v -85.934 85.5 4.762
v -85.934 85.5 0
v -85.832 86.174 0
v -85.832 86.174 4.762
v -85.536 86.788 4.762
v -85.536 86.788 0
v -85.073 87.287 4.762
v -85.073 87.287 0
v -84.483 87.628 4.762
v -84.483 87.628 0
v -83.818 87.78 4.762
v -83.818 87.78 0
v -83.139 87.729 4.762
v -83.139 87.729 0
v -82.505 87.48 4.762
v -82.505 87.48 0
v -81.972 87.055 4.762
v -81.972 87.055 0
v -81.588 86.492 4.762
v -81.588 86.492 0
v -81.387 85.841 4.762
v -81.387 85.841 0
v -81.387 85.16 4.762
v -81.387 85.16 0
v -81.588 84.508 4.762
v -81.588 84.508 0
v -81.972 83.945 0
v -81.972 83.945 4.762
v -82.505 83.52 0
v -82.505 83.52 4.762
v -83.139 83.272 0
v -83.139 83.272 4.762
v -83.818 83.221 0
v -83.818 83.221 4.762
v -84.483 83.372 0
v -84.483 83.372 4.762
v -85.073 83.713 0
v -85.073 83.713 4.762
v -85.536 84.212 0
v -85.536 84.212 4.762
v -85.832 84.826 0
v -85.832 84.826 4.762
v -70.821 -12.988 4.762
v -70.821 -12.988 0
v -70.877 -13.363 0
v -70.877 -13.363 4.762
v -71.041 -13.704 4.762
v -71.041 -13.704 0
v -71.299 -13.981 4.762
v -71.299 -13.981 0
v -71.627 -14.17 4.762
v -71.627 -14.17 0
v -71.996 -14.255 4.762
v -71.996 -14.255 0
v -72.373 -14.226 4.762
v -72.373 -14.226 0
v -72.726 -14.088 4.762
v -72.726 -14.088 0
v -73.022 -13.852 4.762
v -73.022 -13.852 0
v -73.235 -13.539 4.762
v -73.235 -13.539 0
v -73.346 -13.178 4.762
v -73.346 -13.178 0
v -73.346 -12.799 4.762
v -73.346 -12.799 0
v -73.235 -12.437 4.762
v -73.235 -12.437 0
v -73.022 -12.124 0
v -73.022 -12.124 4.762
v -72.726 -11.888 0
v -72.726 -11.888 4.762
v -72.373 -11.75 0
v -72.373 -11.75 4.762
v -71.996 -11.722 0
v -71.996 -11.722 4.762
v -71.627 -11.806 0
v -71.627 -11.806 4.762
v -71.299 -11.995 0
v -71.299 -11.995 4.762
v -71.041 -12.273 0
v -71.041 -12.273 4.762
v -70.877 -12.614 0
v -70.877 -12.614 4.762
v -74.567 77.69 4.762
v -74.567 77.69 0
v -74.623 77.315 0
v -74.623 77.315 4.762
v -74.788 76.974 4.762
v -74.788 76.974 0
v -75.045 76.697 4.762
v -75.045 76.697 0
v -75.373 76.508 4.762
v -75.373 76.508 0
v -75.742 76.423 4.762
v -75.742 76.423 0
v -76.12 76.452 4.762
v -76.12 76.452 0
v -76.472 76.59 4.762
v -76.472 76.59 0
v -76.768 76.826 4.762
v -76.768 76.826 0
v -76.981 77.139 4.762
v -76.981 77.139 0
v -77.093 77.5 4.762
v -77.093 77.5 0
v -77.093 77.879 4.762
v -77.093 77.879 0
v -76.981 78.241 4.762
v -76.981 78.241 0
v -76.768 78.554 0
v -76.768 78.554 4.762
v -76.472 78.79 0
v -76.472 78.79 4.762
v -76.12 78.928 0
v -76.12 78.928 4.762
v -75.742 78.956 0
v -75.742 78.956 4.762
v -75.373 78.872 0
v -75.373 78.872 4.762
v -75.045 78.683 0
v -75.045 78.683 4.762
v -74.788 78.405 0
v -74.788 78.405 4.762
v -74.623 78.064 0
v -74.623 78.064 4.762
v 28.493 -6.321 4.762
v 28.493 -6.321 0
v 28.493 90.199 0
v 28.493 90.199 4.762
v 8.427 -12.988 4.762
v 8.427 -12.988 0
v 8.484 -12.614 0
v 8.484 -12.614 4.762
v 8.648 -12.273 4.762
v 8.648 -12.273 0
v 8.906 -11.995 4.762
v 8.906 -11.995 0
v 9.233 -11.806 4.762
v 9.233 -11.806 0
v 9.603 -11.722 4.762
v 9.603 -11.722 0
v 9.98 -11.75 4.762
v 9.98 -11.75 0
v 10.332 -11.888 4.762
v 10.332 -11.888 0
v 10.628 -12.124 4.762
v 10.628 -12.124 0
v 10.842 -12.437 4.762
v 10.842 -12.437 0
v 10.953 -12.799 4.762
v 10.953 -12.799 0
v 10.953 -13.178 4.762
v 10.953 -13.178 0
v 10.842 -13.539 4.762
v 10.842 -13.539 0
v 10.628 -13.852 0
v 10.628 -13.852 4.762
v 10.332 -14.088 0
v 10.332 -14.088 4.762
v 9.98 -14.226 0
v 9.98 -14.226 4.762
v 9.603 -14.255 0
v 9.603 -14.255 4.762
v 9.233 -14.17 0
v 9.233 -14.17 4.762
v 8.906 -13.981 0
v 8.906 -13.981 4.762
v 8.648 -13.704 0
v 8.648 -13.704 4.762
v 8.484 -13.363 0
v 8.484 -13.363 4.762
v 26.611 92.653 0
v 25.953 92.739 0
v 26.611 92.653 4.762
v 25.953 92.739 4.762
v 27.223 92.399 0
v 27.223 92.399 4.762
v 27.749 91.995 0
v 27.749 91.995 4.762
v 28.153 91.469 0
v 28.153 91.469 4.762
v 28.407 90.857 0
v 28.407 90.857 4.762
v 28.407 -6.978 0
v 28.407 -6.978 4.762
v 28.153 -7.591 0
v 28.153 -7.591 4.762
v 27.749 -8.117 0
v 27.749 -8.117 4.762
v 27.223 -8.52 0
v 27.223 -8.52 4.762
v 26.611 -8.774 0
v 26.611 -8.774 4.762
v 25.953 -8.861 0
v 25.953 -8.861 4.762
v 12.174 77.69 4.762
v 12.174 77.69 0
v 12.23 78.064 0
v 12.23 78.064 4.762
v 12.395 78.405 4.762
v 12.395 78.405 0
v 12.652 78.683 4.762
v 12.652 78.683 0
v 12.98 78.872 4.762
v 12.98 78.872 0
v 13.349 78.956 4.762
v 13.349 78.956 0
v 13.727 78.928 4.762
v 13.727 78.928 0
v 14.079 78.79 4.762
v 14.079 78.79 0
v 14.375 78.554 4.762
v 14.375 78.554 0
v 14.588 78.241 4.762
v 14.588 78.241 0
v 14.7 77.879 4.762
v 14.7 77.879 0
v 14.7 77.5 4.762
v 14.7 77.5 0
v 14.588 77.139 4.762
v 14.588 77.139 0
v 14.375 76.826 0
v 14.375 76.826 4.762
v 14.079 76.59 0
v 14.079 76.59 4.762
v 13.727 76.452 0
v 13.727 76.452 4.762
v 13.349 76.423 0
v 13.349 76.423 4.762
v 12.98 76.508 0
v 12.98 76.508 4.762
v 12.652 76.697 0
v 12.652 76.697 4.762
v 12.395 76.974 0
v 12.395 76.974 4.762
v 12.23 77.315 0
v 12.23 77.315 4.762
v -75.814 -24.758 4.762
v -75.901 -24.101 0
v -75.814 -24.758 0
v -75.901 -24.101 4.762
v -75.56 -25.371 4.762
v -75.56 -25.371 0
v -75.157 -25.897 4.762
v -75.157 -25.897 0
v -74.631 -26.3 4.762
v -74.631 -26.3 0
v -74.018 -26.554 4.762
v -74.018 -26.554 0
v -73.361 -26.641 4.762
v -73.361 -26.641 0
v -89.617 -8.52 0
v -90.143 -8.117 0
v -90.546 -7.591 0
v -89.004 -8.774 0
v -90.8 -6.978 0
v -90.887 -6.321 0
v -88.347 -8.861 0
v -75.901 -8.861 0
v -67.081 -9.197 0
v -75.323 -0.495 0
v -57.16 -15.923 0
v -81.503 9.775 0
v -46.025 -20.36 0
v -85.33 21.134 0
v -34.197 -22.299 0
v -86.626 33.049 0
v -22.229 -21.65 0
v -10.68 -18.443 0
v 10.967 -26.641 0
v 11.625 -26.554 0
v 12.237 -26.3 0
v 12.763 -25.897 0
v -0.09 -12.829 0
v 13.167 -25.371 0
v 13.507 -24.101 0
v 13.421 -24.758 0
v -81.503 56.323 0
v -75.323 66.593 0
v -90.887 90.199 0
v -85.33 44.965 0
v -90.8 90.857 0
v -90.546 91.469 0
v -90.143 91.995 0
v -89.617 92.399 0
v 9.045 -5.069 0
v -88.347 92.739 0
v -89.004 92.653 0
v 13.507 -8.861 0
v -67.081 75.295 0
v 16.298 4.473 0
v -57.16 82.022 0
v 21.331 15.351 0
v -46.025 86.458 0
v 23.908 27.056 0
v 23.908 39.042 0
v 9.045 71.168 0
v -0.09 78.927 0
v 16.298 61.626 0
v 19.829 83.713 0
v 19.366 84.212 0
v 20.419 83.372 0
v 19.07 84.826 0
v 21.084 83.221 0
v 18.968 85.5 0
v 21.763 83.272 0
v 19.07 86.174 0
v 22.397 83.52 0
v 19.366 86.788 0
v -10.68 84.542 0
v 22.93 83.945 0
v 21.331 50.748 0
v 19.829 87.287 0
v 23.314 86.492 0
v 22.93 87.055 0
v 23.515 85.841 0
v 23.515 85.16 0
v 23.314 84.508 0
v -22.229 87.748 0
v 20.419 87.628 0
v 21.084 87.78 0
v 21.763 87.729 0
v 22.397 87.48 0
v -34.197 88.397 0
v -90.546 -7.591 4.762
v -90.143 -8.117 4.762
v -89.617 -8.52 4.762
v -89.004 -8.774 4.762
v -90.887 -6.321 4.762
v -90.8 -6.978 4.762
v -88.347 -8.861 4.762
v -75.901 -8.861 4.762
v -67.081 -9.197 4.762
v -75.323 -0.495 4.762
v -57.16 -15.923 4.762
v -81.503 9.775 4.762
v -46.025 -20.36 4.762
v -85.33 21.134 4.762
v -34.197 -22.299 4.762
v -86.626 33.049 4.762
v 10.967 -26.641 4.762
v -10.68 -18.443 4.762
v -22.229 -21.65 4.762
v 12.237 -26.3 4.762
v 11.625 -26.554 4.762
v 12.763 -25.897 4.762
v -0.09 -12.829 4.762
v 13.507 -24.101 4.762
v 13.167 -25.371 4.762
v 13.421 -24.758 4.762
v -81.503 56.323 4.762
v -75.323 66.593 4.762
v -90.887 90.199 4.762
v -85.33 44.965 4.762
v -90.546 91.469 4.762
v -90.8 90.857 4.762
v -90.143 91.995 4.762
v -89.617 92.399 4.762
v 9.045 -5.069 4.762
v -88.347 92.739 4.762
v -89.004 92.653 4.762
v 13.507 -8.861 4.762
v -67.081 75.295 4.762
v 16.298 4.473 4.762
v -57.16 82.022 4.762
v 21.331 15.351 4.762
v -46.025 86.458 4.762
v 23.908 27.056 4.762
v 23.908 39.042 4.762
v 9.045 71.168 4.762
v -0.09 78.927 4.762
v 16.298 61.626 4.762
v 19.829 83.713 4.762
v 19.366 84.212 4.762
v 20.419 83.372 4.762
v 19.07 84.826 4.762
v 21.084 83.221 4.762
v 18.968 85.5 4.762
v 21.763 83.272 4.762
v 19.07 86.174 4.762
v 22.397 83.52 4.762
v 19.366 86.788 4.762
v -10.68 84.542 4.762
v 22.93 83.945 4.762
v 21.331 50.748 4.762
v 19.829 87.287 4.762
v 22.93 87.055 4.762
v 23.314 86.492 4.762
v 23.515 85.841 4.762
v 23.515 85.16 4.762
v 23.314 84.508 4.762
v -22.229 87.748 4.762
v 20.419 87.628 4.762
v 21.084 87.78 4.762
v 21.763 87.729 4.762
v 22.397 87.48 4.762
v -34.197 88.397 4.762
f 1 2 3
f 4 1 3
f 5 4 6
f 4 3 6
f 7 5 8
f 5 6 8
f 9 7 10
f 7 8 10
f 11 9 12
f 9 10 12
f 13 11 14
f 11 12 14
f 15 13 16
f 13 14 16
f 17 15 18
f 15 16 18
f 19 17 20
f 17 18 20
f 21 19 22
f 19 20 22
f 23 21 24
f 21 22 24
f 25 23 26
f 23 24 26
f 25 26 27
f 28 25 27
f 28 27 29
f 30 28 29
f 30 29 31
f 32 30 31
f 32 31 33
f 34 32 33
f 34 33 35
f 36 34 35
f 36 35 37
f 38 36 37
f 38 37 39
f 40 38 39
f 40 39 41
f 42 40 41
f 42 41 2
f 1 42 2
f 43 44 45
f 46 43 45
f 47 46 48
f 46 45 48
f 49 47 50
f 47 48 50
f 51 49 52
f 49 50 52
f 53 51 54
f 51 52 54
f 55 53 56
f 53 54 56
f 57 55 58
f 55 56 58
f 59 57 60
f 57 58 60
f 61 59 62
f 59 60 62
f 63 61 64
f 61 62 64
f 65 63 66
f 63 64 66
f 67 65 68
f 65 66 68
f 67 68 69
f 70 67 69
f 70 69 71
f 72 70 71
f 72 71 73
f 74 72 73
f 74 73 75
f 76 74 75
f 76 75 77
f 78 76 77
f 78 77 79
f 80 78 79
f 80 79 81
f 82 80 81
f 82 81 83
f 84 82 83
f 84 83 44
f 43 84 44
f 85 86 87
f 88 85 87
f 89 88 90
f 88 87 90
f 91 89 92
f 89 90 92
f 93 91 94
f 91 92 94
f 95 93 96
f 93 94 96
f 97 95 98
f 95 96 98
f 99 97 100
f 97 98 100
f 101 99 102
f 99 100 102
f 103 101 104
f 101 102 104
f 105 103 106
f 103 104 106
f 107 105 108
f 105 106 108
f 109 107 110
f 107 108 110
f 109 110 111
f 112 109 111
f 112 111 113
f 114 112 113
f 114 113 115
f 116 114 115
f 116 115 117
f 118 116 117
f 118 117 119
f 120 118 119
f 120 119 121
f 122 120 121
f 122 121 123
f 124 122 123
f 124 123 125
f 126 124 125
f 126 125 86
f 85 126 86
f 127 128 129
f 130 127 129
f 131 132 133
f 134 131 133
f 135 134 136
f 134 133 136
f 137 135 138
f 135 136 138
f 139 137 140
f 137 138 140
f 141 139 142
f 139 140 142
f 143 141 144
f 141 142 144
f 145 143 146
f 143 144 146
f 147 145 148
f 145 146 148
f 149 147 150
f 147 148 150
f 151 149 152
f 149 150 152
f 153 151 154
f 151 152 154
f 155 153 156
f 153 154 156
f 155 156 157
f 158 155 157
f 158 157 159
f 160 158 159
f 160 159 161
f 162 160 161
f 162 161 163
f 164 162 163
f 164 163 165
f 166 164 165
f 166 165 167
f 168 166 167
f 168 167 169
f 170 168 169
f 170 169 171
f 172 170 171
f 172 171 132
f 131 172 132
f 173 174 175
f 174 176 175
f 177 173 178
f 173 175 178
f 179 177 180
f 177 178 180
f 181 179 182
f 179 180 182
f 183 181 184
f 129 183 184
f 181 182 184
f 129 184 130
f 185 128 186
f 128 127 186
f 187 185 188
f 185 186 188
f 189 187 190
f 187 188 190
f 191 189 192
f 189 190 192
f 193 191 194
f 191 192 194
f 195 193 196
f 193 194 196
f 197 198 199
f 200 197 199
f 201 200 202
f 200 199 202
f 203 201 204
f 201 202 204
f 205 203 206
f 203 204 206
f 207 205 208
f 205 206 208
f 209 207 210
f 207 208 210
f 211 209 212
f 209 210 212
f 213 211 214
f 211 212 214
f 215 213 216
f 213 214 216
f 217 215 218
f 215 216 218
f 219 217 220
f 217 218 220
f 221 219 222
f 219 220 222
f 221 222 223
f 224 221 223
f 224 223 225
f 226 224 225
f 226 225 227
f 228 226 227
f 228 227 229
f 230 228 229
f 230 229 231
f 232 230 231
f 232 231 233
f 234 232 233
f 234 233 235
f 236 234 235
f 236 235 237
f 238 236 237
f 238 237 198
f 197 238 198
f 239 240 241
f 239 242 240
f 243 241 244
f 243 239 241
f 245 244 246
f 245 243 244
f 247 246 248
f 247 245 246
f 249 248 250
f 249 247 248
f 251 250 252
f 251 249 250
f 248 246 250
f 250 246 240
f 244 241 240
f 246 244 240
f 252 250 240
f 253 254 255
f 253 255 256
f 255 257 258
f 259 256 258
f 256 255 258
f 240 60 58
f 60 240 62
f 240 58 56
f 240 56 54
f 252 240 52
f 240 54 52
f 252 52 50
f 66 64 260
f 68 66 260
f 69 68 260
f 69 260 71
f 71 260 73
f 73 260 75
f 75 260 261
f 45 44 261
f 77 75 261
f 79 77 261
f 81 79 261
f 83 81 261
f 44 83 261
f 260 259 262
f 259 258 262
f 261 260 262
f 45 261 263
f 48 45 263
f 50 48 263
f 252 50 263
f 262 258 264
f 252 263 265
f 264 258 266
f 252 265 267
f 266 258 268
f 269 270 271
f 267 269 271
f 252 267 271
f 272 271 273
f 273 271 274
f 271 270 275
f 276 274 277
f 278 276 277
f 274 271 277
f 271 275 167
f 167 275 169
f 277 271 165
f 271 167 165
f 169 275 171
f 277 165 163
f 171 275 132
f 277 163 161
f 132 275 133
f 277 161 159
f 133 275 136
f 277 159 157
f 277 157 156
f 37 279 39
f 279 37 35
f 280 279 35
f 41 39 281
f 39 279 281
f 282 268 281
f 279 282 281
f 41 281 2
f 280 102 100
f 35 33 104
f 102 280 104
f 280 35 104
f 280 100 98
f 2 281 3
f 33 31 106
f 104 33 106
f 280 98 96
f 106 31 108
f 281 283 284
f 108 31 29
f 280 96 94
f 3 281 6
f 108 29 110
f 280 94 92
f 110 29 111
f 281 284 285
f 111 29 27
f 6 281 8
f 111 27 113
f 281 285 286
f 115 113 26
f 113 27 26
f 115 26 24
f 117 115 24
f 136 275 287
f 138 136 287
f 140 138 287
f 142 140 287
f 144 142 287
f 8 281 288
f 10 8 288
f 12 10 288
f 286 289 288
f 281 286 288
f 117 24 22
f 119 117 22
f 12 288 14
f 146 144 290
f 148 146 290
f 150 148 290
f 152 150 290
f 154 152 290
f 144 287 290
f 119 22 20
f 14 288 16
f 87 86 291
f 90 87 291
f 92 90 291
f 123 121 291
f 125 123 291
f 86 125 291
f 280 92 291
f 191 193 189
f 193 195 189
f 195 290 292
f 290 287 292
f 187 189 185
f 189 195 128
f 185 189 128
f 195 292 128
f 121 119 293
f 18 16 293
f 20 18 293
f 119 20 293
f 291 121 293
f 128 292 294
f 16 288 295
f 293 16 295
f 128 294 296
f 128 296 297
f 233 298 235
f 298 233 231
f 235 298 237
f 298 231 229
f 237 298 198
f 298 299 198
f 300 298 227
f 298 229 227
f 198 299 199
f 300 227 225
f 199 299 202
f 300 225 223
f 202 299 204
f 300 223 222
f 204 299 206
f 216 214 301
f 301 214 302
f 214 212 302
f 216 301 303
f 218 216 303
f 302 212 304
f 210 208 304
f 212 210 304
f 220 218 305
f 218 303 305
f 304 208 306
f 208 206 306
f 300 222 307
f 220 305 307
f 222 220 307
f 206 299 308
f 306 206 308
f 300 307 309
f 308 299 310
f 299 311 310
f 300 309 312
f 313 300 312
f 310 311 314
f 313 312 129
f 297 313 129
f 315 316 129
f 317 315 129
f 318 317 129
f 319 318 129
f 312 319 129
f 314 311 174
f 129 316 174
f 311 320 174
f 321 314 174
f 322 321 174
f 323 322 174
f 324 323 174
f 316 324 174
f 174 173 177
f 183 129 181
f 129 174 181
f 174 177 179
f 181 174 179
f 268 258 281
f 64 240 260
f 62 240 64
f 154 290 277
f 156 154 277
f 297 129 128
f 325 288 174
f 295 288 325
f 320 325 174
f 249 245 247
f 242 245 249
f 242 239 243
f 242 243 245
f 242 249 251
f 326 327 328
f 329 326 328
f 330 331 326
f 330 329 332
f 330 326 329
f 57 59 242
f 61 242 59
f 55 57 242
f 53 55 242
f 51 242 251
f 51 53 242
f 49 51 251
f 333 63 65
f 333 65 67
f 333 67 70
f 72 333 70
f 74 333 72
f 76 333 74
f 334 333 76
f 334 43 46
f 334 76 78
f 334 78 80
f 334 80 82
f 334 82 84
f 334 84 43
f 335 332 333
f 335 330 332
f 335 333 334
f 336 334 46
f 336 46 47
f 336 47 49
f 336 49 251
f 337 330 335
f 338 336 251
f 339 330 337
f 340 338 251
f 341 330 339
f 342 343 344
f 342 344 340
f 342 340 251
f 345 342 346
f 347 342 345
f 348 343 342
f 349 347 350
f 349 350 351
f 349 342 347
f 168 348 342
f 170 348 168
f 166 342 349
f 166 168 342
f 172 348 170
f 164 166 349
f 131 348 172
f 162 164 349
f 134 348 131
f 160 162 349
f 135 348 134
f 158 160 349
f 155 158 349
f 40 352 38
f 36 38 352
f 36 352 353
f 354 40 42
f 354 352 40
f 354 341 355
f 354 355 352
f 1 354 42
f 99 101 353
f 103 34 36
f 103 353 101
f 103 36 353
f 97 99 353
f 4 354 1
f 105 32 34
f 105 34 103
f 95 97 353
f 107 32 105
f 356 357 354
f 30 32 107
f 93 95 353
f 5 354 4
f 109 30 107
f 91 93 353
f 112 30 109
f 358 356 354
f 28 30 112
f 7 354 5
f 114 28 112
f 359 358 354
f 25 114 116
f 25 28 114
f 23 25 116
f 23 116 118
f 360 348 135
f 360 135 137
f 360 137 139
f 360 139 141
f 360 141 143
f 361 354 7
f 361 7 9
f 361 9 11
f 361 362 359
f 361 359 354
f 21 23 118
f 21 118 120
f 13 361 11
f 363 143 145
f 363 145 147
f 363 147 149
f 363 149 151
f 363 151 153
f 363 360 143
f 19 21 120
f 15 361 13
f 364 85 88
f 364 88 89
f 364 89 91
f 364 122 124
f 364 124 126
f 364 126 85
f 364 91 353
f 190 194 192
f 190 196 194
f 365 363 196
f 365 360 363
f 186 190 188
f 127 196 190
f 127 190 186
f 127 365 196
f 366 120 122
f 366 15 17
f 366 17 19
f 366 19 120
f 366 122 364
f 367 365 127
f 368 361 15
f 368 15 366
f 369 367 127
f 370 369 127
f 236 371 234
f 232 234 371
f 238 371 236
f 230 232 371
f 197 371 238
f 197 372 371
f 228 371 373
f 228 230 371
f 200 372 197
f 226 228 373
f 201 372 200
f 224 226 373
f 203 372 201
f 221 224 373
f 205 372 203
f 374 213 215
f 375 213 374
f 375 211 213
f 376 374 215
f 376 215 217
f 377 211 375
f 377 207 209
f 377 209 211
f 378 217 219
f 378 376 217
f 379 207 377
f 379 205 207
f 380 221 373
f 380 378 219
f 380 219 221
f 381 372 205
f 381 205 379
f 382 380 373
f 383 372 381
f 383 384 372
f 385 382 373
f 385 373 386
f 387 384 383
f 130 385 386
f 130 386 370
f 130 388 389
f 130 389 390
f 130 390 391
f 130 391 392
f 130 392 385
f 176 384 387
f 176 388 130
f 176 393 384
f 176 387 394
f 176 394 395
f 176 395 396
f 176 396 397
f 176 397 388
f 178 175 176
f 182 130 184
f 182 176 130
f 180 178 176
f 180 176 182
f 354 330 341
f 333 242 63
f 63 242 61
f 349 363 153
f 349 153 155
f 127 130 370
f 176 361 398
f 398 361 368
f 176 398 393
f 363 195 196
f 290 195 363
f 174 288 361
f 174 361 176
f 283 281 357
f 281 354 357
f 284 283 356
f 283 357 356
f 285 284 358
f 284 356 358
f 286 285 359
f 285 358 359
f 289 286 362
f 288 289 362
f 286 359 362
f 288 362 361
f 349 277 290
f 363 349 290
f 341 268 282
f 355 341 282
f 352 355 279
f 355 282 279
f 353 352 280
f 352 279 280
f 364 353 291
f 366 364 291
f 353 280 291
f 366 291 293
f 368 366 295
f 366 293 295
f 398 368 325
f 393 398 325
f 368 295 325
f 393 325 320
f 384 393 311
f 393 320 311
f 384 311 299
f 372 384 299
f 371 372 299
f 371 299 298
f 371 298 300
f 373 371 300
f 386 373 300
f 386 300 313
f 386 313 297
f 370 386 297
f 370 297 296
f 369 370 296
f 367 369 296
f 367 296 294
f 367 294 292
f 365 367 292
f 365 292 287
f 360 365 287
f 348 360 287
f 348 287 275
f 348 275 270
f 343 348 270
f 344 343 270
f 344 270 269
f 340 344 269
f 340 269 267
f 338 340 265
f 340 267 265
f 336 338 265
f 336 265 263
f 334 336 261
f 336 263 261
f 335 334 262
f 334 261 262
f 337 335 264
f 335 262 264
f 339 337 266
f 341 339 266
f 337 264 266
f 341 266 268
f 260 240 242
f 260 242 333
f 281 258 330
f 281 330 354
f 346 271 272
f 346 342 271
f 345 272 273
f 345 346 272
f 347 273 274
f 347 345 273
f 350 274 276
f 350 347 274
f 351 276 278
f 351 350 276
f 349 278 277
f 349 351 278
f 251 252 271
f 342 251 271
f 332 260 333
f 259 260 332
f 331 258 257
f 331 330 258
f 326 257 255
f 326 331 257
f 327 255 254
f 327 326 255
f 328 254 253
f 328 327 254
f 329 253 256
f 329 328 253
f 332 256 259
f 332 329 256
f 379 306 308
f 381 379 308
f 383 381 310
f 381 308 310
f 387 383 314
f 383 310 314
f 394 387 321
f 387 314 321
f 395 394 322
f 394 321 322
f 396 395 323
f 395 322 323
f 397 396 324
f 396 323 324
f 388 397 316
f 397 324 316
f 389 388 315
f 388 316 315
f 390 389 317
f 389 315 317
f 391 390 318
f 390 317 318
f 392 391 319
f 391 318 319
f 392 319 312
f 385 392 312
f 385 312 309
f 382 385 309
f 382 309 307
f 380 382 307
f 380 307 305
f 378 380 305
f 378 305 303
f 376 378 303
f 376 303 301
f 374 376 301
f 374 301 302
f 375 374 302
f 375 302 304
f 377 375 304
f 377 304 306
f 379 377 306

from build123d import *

# Parameters (mm, degrees)
SKETCH1_W           = 119.38
SKETCH1_H           = 119.38
BOSS_EXTRUDE1_DEPTH = 4.7625
CUT_EXTRUDE1_REACH  = 131.937
SKETCH2_R           = 2.286
SKETCH2_R_2         = 1.27
SKETCH2_R_3         = 55.42912263
CUT_EXTRUDE2_REACH  = 131.937
SKETCH4_W           = 14.986
SKETCH4_H           = 17.78
FILLET2_R           = 2.54
FILLET3_R           = 2.54


with BuildPart() as part:
    # Sketch1 → Boss-Extrude1 (new body)
    with BuildSketch(Plane.XY):
        with Locations((-31.19657191, 33.049217791)):
            Rectangle(SKETCH1_W, SKETCH1_H)
    extrude(amount=BOSS_EXTRUDE1_DEPTH)

    # Sketch2 → Cut-Extrude1 (cut, up to next)
    with BuildSketch(Plane(origin=(0, 0, 0), x_dir=(-1, 0, 0), z_dir=(0, 0, -1)), mode=Mode.PRIVATE) as cut_extrude1_sk1:
        with Locations((-21.25442809, 85.500217791)):
            Circle(SKETCH2_R)
    cut_extrude1_tool1 = extrude(cut_extrude1_sk1.sketch, amount=-CUT_EXTRUDE1_REACH, mode=Mode.PRIVATE) & part.part
    # Sketch2 → Cut-Extrude1 (cut, up to next)
    with BuildSketch(Plane(origin=(0, 0, 0), x_dir=(-1, 0, 0), z_dir=(0, 0, -1)), mode=Mode.PRIVATE) as cut_extrude1_sk2:
        with Locations((83.64757191, 85.500217791)):
            Circle(SKETCH2_R)
    cut_extrude1_tool2 = extrude(cut_extrude1_sk2.sketch, amount=-CUT_EXTRUDE1_REACH, mode=Mode.PRIVATE) & part.part
    # Sketch2 → Cut-Extrude1 (cut, up to next)
    with BuildSketch(Plane(origin=(0, 0, 0), x_dir=(-1, 0, 0), z_dir=(0, 0, -1)), mode=Mode.PRIVATE) as cut_extrude1_sk3:
        with Locations(Location((72.09057191, -12.988282209, 0), (0, 0, 180))):
            Circle(SKETCH2_R_2)
    cut_extrude1_tool3 = extrude(cut_extrude1_sk3.sketch, amount=-CUT_EXTRUDE1_REACH, mode=Mode.PRIVATE) & part.part
    # Sketch2 → Cut-Extrude1 (cut, up to next)
    with BuildSketch(Plane(origin=(0, 0, 0), x_dir=(-1, 0, 0), z_dir=(0, 0, -1)), mode=Mode.PRIVATE) as cut_extrude1_sk4:
        with Locations((31.19657191, 33.049217791)):
            Circle(SKETCH2_R_3)
    cut_extrude1_tool4 = extrude(cut_extrude1_sk4.sketch, amount=-CUT_EXTRUDE1_REACH, mode=Mode.PRIVATE) & part.part
    # Sketch2 → Cut-Extrude1 (cut, up to next)
    with BuildSketch(Plane(origin=(0, 0, 0), x_dir=(-1, 0, 0), z_dir=(0, 0, -1)), mode=Mode.PRIVATE) as cut_extrude1_sk5:
        with Locations((-13.44392809, 77.689717791)):
            Circle(SKETCH2_R_2)
    cut_extrude1_tool5 = extrude(cut_extrude1_sk5.sketch, amount=-CUT_EXTRUDE1_REACH, mode=Mode.PRIVATE) & part.part
    # Sketch2 → Cut-Extrude1 (cut, up to next)
    with BuildSketch(Plane(origin=(0, 0, 0), x_dir=(-1, 0, 0), z_dir=(0, 0, -1)), mode=Mode.PRIVATE) as cut_extrude1_sk6:
        with Locations(Location((75.83707191, 77.689717791, 0), (0, 0, 180))):
            Circle(SKETCH2_R_2)
    cut_extrude1_tool6 = extrude(cut_extrude1_sk6.sketch, amount=-CUT_EXTRUDE1_REACH, mode=Mode.PRIVATE) & part.part
    # Sketch2 → Cut-Extrude1 (cut, up to next)
    with BuildSketch(Plane(origin=(0, 0, 0), x_dir=(-1, 0, 0), z_dir=(0, 0, -1)), mode=Mode.PRIVATE) as cut_extrude1_sk7:
        with Locations((-9.69742809, -12.988282209)):
            Circle(SKETCH2_R_2)
    cut_extrude1_tool7 = extrude(cut_extrude1_sk7.sketch, amount=-CUT_EXTRUDE1_REACH, mode=Mode.PRIVATE) & part.part
    add(cut_extrude1_tool1.solids().sort_by_distance((21.254428, 85.500218, 0))[0], mode=Mode.SUBTRACT)
    add(cut_extrude1_tool2.solids().sort_by_distance((-83.647572, 85.500218, 0))[0], mode=Mode.SUBTRACT)
    add(cut_extrude1_tool3.solids().sort_by_distance((-72.090572, -12.988282, 0))[0], mode=Mode.SUBTRACT)
    add(cut_extrude1_tool4.solids().sort_by_distance((-31.196572, 33.049218, 0))[0], mode=Mode.SUBTRACT)
    add(cut_extrude1_tool5.solids().sort_by_distance((13.443928, 77.689718, 0))[0], mode=Mode.SUBTRACT)
    add(cut_extrude1_tool6.solids().sort_by_distance((-75.837072, 77.689718, 0))[0], mode=Mode.SUBTRACT)
    add(cut_extrude1_tool7.solids().sort_by_distance((9.697428, -12.988282, 0))[0], mode=Mode.SUBTRACT)

    # Sketch4 → Cut-Extrude2 (cut, up to next)
    with BuildSketch(Plane(origin=(0, 0, 0), x_dir=(-1, 0, 0), z_dir=(0, 0, -1)), mode=Mode.PRIVATE) as cut_extrude2_sk1:
        with Locations((-21.00042809, -17.750782209)):
            Rectangle(SKETCH4_W, SKETCH4_H)
    cut_extrude2_tool1 = extrude(cut_extrude2_sk1.sketch, amount=-CUT_EXTRUDE2_REACH, mode=Mode.PRIVATE) & part.part
    # Sketch4 → Cut-Extrude2 (cut, up to next)
    with BuildSketch(Plane(origin=(0, 0, 0), x_dir=(-1, 0, 0), z_dir=(0, 0, -1)), mode=Mode.PRIVATE) as cut_extrude2_sk2:
        with Locations((83.39357191, -17.750782209)):
            Rectangle(SKETCH4_W, SKETCH4_H)
    cut_extrude2_tool2 = extrude(cut_extrude2_sk2.sketch, amount=-CUT_EXTRUDE2_REACH, mode=Mode.PRIVATE) & part.part
    add(cut_extrude2_tool1.solids().sort_by_distance((21.000428, -17.750782, 0))[0], mode=Mode.SUBTRACT)
    add(cut_extrude2_tool2.solids().sort_by_distance((-83.393572, -17.750782, 0))[0], mode=Mode.SUBTRACT)

    # Fillet2
    fillet2_edges = [part.edges().sort_by_distance(p)[0] for p in [
        (-90.88657191, 92.739217791, 2.38125),
        (28.49342809, 92.739217791, 2.38125),
    ]]
    fillet(fillet2_edges, radius=FILLET2_R)

    # Fillet3
    fillet3_edges = [part.edges().sort_by_distance(p)[0] for p in [
        (28.49342809, -8.860782209, 2.38125),
        (13.50742809, -26.640782209, 2.38125),
        (-75.90057191, -26.640782209, 2.38125),
        (-90.88657191, -8.860782209, 2.38125),
    ]]
    fillet(fillet3_edges, radius=FILLET3_R)


solid = part.part
